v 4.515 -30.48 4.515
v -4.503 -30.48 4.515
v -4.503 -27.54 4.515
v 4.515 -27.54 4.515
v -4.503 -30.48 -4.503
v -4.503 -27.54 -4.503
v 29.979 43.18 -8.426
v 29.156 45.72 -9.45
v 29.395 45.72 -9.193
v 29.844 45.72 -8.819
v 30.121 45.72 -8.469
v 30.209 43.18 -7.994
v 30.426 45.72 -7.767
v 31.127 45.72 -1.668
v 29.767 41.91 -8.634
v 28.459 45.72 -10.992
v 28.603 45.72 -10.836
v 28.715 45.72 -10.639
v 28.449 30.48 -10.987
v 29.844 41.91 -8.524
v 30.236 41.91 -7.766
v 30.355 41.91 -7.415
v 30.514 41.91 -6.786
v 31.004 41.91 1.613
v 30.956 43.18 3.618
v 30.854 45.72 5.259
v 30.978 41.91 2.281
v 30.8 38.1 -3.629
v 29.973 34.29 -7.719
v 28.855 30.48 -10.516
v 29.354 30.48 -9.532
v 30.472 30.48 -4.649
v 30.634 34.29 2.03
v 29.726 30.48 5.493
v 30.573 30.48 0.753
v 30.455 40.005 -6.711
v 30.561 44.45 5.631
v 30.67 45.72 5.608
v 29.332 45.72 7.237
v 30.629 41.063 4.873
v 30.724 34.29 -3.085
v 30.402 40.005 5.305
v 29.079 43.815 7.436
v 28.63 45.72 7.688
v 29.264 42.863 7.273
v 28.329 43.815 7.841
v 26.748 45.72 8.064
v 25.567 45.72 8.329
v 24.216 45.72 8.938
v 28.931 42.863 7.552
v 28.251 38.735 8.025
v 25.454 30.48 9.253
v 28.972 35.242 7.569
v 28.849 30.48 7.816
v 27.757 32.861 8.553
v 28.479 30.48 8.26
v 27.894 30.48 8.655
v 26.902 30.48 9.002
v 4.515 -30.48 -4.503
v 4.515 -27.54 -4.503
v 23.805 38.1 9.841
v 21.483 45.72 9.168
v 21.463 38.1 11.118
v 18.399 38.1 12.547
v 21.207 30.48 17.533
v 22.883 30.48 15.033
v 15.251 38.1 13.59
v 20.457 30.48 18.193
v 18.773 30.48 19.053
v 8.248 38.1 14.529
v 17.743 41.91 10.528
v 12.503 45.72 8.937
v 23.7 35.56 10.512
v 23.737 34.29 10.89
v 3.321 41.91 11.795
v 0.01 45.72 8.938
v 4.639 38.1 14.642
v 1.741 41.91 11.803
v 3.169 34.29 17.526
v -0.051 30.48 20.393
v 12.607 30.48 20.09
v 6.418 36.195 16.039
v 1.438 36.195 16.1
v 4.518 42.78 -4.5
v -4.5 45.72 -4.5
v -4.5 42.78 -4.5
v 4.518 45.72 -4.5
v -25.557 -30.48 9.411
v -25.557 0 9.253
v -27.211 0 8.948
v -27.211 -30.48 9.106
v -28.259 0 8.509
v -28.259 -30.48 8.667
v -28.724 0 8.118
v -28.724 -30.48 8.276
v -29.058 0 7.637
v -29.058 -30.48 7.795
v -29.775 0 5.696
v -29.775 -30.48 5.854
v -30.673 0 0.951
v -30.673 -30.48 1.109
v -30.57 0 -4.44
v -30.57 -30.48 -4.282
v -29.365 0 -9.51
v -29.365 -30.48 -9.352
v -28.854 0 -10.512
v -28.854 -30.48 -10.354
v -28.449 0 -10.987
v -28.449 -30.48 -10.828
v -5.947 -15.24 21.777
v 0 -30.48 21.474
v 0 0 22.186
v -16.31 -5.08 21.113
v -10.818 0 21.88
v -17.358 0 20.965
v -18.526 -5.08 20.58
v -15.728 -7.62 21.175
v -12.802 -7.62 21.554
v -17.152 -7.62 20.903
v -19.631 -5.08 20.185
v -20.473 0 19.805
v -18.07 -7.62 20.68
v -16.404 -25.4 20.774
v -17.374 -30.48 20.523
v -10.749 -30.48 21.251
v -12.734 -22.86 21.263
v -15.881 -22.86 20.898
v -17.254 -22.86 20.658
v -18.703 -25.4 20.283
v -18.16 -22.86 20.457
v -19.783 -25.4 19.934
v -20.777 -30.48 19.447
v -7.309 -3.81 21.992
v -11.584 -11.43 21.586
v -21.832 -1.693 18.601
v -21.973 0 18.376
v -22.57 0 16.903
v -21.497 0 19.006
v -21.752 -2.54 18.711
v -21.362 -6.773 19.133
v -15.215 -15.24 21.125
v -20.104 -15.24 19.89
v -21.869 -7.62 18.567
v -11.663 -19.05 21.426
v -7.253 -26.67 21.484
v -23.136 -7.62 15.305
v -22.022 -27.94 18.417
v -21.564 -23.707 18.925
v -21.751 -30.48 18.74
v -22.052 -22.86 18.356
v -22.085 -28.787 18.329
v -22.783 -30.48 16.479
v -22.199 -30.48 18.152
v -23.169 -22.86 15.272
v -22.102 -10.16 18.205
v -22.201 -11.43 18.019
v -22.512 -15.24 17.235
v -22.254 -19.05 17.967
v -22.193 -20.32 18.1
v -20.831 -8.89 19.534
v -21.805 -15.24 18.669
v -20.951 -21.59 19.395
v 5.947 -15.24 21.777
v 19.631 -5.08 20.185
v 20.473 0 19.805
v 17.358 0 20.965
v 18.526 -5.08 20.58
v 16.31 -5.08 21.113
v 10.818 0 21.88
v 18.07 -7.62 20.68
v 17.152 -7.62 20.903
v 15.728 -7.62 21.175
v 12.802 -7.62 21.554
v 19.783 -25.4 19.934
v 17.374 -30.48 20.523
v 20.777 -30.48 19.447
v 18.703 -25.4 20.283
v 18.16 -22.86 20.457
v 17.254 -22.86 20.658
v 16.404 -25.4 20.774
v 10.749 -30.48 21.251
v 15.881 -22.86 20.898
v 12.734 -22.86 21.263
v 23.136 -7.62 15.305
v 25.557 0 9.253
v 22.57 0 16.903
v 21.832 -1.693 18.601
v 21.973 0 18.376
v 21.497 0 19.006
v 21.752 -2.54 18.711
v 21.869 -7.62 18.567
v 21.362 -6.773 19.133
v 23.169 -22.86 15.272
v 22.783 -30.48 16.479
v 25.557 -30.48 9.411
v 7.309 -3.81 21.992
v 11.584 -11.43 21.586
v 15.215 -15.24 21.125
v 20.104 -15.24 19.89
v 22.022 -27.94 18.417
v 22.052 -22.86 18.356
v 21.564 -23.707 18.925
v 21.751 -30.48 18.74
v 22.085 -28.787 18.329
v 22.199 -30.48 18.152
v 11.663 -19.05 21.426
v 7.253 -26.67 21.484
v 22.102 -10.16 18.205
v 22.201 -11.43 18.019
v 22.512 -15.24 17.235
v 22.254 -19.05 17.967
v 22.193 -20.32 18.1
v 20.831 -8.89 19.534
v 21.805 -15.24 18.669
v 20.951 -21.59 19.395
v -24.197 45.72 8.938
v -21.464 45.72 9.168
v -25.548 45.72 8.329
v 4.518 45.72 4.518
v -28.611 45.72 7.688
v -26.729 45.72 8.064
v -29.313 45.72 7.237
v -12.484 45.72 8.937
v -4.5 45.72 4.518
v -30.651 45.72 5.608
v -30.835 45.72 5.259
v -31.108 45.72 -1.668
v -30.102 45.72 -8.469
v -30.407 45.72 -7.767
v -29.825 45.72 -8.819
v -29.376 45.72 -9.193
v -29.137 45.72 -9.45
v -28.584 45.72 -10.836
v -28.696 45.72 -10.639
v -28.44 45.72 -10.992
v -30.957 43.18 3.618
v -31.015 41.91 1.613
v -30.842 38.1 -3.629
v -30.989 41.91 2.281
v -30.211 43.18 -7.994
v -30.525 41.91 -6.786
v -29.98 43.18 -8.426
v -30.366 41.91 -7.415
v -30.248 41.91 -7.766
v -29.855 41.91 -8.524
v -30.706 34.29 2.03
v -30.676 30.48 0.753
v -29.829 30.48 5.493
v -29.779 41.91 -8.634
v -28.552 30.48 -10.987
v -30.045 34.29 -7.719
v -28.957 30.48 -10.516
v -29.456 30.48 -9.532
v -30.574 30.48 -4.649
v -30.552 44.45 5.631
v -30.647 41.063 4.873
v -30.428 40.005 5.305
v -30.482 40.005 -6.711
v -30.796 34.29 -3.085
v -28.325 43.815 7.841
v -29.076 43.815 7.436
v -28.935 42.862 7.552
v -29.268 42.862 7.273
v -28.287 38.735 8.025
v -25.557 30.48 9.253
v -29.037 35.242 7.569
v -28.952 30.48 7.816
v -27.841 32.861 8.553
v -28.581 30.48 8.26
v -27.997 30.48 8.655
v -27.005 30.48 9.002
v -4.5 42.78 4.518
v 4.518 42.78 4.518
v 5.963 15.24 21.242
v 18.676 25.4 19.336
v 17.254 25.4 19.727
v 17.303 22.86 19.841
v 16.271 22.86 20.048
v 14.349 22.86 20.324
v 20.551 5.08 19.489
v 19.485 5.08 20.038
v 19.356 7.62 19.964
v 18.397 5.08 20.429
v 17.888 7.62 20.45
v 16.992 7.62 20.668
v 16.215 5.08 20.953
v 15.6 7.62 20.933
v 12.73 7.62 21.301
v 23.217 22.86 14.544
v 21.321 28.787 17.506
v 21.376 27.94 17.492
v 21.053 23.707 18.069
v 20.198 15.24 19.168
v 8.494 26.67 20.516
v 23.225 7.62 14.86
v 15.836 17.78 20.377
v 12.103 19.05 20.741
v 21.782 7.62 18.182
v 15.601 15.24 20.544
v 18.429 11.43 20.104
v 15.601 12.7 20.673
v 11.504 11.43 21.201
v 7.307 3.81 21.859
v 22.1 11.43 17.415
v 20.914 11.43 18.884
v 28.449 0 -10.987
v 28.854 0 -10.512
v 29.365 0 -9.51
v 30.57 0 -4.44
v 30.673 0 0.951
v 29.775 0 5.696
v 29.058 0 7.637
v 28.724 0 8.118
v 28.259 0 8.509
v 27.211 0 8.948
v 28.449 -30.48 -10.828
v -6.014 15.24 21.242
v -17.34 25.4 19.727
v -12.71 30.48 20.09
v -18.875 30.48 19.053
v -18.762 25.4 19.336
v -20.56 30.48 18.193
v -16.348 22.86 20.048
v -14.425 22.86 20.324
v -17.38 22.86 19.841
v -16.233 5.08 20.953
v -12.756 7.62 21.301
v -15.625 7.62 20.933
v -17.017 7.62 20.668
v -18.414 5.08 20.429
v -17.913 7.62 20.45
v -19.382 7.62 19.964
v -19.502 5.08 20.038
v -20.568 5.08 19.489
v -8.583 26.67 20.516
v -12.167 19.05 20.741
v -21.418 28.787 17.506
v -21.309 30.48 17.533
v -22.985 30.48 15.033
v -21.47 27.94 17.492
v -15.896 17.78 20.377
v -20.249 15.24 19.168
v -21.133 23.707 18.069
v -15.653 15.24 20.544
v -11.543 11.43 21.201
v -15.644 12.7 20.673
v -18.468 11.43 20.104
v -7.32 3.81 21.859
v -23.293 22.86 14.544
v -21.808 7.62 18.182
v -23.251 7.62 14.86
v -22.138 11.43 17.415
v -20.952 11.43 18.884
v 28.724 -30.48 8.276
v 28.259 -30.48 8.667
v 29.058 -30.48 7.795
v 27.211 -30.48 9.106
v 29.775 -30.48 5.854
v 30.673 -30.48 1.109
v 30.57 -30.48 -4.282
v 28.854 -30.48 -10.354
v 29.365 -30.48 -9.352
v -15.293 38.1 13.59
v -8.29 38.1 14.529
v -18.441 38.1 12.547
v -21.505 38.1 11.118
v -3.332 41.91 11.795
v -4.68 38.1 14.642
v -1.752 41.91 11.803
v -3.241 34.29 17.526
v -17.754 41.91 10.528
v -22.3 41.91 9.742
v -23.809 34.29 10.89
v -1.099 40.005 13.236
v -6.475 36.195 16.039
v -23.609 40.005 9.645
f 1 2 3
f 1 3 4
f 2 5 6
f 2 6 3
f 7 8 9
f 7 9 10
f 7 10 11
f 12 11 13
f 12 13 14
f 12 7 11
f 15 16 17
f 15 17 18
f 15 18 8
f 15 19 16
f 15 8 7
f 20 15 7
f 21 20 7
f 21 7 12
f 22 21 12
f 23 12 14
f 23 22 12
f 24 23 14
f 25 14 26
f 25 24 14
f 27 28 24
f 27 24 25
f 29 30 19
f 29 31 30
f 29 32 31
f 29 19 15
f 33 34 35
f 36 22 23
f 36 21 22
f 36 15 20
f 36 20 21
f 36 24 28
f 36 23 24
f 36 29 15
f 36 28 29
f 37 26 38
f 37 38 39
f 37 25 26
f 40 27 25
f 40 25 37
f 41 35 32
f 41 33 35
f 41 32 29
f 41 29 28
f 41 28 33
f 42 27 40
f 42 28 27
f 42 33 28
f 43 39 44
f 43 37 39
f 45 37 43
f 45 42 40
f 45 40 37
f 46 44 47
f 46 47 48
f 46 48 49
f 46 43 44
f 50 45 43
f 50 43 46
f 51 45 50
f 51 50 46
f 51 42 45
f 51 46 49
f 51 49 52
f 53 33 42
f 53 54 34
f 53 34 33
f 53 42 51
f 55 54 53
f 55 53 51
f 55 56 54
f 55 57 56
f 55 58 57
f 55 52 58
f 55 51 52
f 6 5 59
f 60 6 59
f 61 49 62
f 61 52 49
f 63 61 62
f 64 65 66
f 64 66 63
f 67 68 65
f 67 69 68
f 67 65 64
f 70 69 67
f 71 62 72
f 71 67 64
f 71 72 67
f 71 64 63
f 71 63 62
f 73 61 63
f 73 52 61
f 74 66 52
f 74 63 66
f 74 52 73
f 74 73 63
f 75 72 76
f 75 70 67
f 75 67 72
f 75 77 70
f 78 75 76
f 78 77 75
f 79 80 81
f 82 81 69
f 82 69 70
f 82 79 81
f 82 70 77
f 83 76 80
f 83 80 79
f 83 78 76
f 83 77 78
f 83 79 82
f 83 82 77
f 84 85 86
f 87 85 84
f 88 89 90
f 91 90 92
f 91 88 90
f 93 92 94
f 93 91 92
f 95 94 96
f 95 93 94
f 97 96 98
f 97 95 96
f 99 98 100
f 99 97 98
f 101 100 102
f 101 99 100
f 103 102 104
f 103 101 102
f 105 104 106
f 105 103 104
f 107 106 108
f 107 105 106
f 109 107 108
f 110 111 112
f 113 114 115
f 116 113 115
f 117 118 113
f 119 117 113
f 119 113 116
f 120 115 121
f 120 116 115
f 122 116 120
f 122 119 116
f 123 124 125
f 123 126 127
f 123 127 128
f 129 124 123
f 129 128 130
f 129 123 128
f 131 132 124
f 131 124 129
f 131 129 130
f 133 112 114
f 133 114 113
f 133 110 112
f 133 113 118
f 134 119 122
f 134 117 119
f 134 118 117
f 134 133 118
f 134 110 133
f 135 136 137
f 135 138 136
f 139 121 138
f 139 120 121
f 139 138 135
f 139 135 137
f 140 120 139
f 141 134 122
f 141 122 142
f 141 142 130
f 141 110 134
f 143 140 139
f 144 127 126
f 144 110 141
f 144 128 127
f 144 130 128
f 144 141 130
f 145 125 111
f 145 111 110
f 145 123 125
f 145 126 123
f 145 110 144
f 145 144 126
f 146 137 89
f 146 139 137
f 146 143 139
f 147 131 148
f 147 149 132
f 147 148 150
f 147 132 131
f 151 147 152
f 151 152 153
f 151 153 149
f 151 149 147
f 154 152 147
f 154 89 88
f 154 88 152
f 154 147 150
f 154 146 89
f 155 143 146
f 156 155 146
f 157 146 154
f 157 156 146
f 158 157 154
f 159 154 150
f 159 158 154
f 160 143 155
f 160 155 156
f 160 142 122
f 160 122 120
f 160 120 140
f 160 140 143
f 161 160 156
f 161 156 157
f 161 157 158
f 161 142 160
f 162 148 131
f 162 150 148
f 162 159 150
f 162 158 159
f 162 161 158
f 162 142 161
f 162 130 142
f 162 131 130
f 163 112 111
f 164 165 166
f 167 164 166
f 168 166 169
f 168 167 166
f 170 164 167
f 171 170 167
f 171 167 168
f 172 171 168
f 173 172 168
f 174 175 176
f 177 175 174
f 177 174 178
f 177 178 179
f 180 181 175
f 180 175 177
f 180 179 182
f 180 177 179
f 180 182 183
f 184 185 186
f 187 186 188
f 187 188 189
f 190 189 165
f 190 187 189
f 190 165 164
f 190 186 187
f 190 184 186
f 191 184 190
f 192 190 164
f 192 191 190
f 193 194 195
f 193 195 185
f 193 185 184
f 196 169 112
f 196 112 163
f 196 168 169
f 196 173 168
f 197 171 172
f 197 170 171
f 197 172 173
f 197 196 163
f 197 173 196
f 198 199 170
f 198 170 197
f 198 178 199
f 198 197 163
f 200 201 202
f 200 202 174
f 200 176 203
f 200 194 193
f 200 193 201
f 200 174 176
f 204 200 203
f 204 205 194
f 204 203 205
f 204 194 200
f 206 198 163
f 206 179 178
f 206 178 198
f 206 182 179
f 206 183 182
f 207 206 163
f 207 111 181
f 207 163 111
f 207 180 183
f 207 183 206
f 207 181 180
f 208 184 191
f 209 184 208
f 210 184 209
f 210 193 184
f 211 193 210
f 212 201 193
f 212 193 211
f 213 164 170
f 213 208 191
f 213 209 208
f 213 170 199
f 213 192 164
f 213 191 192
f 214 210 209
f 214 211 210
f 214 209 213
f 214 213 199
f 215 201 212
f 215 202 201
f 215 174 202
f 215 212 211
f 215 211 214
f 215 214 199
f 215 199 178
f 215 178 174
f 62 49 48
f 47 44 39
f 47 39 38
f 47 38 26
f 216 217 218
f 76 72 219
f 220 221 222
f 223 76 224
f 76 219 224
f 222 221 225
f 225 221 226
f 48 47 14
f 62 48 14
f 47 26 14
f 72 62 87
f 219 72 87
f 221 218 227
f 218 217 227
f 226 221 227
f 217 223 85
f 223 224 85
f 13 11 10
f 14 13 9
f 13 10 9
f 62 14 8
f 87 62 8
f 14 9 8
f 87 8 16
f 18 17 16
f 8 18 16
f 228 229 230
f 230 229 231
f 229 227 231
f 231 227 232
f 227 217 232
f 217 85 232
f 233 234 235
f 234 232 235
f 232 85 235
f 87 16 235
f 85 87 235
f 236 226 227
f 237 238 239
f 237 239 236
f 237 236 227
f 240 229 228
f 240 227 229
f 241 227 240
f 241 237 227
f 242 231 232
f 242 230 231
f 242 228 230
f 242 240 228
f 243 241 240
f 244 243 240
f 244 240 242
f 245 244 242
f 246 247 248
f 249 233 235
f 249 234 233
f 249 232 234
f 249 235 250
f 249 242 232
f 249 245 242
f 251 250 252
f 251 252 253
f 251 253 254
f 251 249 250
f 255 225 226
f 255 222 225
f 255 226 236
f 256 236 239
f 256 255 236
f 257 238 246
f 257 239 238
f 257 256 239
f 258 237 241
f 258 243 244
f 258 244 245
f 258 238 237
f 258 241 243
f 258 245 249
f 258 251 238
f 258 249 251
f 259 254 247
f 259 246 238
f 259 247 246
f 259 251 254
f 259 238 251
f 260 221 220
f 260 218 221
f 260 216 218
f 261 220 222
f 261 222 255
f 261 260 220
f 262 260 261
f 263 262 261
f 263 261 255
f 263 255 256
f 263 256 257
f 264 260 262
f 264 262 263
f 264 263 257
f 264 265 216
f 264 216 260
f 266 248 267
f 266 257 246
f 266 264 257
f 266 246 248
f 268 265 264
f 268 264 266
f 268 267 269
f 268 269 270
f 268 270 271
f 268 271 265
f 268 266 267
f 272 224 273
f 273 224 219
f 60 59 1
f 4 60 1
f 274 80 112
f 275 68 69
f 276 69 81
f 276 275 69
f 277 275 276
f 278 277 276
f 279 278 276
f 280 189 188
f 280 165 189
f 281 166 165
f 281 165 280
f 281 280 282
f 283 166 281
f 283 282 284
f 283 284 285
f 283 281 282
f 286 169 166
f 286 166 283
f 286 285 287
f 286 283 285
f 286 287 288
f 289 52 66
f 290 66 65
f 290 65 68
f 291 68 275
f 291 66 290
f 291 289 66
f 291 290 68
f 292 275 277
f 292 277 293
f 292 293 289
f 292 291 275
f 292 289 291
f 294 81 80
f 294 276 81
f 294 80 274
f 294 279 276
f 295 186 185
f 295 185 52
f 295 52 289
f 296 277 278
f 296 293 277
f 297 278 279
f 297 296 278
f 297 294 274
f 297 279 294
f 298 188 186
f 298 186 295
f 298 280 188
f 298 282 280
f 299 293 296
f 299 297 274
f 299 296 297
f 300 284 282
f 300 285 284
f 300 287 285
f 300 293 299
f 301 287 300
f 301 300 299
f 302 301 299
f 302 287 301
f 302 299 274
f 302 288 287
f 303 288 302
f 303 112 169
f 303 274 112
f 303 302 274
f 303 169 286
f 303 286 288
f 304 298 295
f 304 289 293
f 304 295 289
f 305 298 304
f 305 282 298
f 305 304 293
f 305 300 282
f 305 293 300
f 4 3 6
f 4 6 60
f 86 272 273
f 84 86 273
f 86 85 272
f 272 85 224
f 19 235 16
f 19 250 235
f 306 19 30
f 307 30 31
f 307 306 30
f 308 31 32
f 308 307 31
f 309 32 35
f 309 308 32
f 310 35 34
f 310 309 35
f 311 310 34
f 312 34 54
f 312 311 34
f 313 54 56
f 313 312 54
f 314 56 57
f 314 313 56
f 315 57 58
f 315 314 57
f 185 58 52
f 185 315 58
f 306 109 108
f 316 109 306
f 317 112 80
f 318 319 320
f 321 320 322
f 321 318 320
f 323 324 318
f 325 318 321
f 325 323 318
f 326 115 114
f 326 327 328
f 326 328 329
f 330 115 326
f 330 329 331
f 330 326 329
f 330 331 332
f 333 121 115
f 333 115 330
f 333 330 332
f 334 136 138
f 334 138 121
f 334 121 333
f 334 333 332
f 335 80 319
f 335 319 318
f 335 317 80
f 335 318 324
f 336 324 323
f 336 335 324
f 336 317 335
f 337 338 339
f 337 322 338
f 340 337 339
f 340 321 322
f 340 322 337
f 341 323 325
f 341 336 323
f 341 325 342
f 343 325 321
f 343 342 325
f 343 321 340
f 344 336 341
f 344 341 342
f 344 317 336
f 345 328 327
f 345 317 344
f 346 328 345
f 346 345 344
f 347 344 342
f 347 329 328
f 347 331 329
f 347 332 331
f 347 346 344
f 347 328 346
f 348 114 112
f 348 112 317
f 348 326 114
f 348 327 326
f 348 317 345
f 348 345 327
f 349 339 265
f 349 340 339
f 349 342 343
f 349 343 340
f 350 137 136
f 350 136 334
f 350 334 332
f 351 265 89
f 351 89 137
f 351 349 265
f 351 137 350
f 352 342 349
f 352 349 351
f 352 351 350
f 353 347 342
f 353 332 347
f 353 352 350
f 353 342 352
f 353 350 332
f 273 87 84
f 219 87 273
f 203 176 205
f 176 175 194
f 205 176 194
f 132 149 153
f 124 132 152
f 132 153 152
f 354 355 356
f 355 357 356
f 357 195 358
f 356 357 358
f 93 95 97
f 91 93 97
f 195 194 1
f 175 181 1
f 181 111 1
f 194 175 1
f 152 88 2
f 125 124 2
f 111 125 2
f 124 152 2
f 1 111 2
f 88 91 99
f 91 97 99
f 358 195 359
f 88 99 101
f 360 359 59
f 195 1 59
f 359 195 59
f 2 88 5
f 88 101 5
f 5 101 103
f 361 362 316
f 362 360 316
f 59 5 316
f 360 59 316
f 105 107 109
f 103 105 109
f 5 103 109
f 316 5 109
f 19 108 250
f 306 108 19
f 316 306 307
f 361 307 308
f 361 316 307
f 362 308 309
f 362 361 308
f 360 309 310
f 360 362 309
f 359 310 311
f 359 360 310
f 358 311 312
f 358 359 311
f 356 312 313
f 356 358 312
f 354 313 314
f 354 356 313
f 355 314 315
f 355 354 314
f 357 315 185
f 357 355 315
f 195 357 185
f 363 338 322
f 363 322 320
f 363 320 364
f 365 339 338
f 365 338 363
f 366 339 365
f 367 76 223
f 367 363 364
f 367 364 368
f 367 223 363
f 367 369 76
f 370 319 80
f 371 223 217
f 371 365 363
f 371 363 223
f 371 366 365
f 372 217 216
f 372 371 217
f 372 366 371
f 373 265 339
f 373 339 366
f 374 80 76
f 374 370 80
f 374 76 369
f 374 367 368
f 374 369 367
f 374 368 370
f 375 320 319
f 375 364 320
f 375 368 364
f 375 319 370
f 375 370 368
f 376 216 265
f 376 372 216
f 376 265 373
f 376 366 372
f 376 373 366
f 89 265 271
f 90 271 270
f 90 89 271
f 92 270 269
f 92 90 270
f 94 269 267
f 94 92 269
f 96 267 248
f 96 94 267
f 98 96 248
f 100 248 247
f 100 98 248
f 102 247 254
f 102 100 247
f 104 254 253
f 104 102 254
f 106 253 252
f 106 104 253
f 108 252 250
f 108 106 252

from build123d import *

# Parameters (mm, degrees)
F8_W      = 150.3
F8_H      = 150.3
F15_DEPTH = 49
F16_W     = 150.3
F16_H     = 150.3
F17_DEPTH = 49
F18_SCALE = 0.06


with BuildPart() as f9:
    # F7 (on offset) → F9 section 0
    with BuildSketch(Plane.XZ.offset(-762)):
        with BuildLine():
            Line((0.1584887505, -183.1980922269), (0.1584887505, 148.9692763008))
            add(Edge.make_bspline(
                [(-403.2837748528, 148.9692763008), (-361.9413971901, 155.9843108572), (-300.8599900284, 146.0628981015), (-125.8436559494, 151.2423181929), (-46.7571673235, 148.9692763008), (0.1584887505, 148.9692763008)],
                knots=[0, 0, 0, 0, 0.2984259287, 0.6695630928, 1, 1, 1, 1], degree=3))
            add(Edge.make_bspline(
                [(-473.9971756935, -183.1980922269), (-480.5770214293, -177.9163295695), (-481.5710687682, -151.5276075961), (-520.6987799625, -148.0816034945), (-521.1208757291, 78.7741568252), (-510.6917945334, 93.6804495958), (-477.9211180885, 141.4877688131), (-435.9205000594, 129.5729096626), (-403.2837748528, 148.9692763008)],
                knots=[0.0998476522, 0.0998476522, 0.0998476522, 0.0998476522, 0.2041896676, 0.3100333363, 0.5970663664, 0.6946290463, 0.8249758157, 1, 1, 1, 1], degree=3))
            Line((-473.9971756935, -183.1980922269), (-448.5557532602, -183.1980922269))
            Line((-448.5557532602, -183.1980922269), (0.1584887505, -183.1980922269))
        make_face()
    # F3 (on offset) → F9 section 1
    with BuildSketch(Plane.XZ.offset(-508)):
        with BuildLine():
            Line((-448.7142420107, -183.1095217108), (-0.8547306061, -183.1095217108))
            Line((-0.8547306061, -183.1095217108), (-0.8547306061, 339.8833276392))
            add(Edge.make_bspline(
                [(-425.9420335293, 154.2110444666), (-412.46534384, 180.6685756473), (-406.3800631287, 202.4829286635), (-381.928427354, 254.8373079925), (-342.7353016167, 318.766364781), (-268.3299880886, 341.1130193989), (-0.8547306061, 339.8833276392)],
                knots=[0, 0, 0, 0, 0.1858707903, 0.3633687117, 0.53553365, 1, 1, 1, 1], degree=3))
            add(Edge.make_bspline(
                [(-475.8651256561, -183.1095217108), (-495.6553124123, -166.8569903526), (-526.8397519259, -26.030289038), (-492.5296911823, 120.5917099646), (-474.0125038157, 148.3755705213), (-425.9420335293, 154.2110444666)],
                knots=[0.1352188376, 0.1352188376, 0.1352188376, 0.1352188376, 0.4578837471, 0.7745389991, 1, 1, 1, 1], degree=3))
            Line((-475.8651256561, -183.1095217108), (-448.7142420107, -183.1095217108))
        make_face()
    loft()

    # F7 (on offset) → F10 section 0
    with BuildSketch(Plane.XZ.offset(-762)):
        with BuildLine():
            add(Edge.make_bspline(
                [(403.6007523537, 148.9692763008), (362.258374691, 155.9843108572), (301.1769675294, 146.0628981015), (126.1606334503, 151.2423181929), (47.0741448244, 148.9692763008), (0.1584887505, 148.9692763008)],
                knots=[0, 0, 0, 0, 0.2984259287, 0.6695630928, 1, 1, 1, 1], degree=3))
            Line((0.1584887505, 148.9692763008), (0.1584887505, -183.1980922269))
            Line((0.1584887505, -183.1980922269), (448.8727307612, -183.1980922269))
            Line((448.8727307612, -183.1980922269), (474.3141531944, -183.1980922269))
            add(Edge.make_bspline(
                [(474.3141531944, -183.1980922269), (480.8939989302, -177.9163295695), (481.8880462691, -151.5276075961), (521.0157574634, -148.0816034945), (521.43785323, 78.7741568252), (511.0087720343, 93.6804495958), (478.2380955895, 141.4877688131), (436.2374775603, 129.5729096626), (403.6007523537, 148.9692763008)],
                knots=[0.0998476522, 0.0998476522, 0.0998476522, 0.0998476522, 0.2041896676, 0.3100333363, 0.5970663664, 0.6946290463, 0.8249758157, 1, 1, 1, 1], degree=3))
        make_face()
    # F3 (on offset) → F10 section 1
    with BuildSketch(Plane.XZ.offset(-508)):
        with BuildLine():
            Line((-0.8547306061, 339.8833276392), (-0.8547306061, -183.1095217108))
            Line((-0.8547306061, -183.1095217108), (447.0047807985, -183.1095217108))
            Line((447.0047807985, -183.1095217108), (474.155664444, -183.1095217108))
            add(Edge.make_bspline(
                [(474.155664444, -183.1095217108), (493.9458512002, -166.8569903526), (525.1302907138, -26.030289038), (490.8202299702, 120.5917099646), (472.3030426035, 148.3755705213), (424.2325723171, 154.2110444666)],
                knots=[0.1352188376, 0.1352188376, 0.1352188376, 0.1352188376, 0.4578837471, 0.7745389991, 1, 1, 1, 1], degree=3))
            add(Edge.make_bspline(
                [(424.2325723171, 154.2110444666), (410.7558826278, 180.6685756473), (404.6706019165, 202.4829286635), (380.2189661418, 254.8373079925), (341.0258404045, 318.766364781), (266.6205268764, 341.1130193989), (-0.8547306061, 339.8833276392)],
                knots=[0, 0, 0, 0, 0.1858707903, 0.3633687117, 0.53553365, 1, 1, 1, 1], degree=3))
        make_face()
    loft()

    # F3 (on offset) → F11 section 0
    with BuildSketch(Plane.XZ.offset(-508)):
        with BuildLine():
            Line((-448.7142420107, -183.1095217108), (-0.8547306061, -183.1095217108))
            Line((-0.8547306061, -183.1095217108), (-0.8547306061, 339.8833276392))
            add(Edge.make_bspline(
                [(-425.9420335293, 154.2110444666), (-412.46534384, 180.6685756473), (-406.3800631287, 202.4829286635), (-381.928427354, 254.8373079925), (-342.7353016167, 318.766364781), (-268.3299880886, 341.1130193989), (-0.8547306061, 339.8833276392)],
                knots=[0, 0, 0, 0, 0.1858707903, 0.3633687117, 0.53553365, 1, 1, 1, 1], degree=3))
            add(Edge.make_bspline(
                [(-475.8651256561, -183.1095217108), (-495.6553124123, -166.8569903526), (-526.8397519259, -26.030289038), (-492.5296911823, 120.5917099646), (-474.0125038157, 148.3755705213), (-425.9420335293, 154.2110444666)],
                knots=[0.1352188376, 0.1352188376, 0.1352188376, 0.1352188376, 0.4578837471, 0.7745389991, 1, 1, 1, 1], degree=3))
            Line((-475.8651256561, -183.1095217108), (-448.7142420107, -183.1095217108))
        make_face()
    # F0 (on Front) → F11 section 1
    with BuildSketch(Plane.XZ):
        with BuildLine():
            Line((-448.7142418908, -183.1095215051), (1.199e-07, -183.1095215051))
            Line((1.199e-07, -183.1095215051), (1.199e-07, 369.7673383983))
            add(Edge.make_bspline(
                [(-425.9420334094, 154.2110446723), (-412.7864856493, 180.0381077778), (-406.2769170657, 200.4261421029), (-376.8966252496, 276.0657125006), (-361.6660609239, 334.9040835407), (-265.0778939608, 370.9860085104), (1.199e-07, 369.7673383983)],
                knots=[0, 0, 0, 0, 0.181441594, 0.3874182486, 0.5396966318, 1, 1, 1, 1], degree=3))
            add(Edge.make_bspline(
                [(-474.1556643241, -183.1095215051), (-493.3795421324, -167.1268559789), (-527.9322253212, -26.0726288897), (-492.2015831078, 120.5996786697), (-474.200308203, 148.3527723582), (-425.9420334094, 154.2110446723)],
                knots=[0.1314042252, 0.1314042252, 0.1314042252, 0.1314042252, 0.4557657758, 0.7736581549, 1, 1, 1, 1], degree=3))
            Line((-474.1556643241, -183.1095215051), (-448.7142418908, -183.1095215051))
        make_face()
    loft()

    # F3 (on offset) → F12 section 0
    with BuildSketch(Plane.XZ.offset(-508)):
        with BuildLine():
            Line((-0.8547306061, 339.8833276392), (-0.8547306061, -183.1095217108))
            Line((-0.8547306061, -183.1095217108), (447.0047807985, -183.1095217108))
            Line((447.0047807985, -183.1095217108), (474.155664444, -183.1095217108))
            add(Edge.make_bspline(
                [(474.155664444, -183.1095217108), (493.9458512002, -166.8569903526), (525.1302907138, -26.030289038), (490.8202299702, 120.5917099646), (472.3030426035, 148.3755705213), (424.2325723171, 154.2110444666)],
                knots=[0.1352188376, 0.1352188376, 0.1352188376, 0.1352188376, 0.4578837471, 0.7745389991, 1, 1, 1, 1], degree=3))
            add(Edge.make_bspline(
                [(424.2325723171, 154.2110444666), (410.7558826278, 180.6685756473), (404.6706019165, 202.4829286635), (380.2189661418, 254.8373079925), (341.0258404045, 318.766364781), (266.6205268764, 341.1130193989), (-0.8547306061, 339.8833276392)],
                knots=[0, 0, 0, 0, 0.1858707903, 0.3633687117, 0.53553365, 1, 1, 1, 1], degree=3))
        make_face()
    # F0 (on Front) → F12 section 1
    with BuildSketch(Plane.XZ):
        with BuildLine():
            Line((1.199e-07, 369.7673383983), (1.199e-07, -183.1095215051))
            Line((1.199e-07, -183.1095215051), (448.7142421306, -183.1095215051))
            Line((448.7142421306, -183.1095215051), (474.1556645639, -183.1095215051))
            add(Edge.make_bspline(
                [(474.1556645639, -183.1095215051), (493.3795423723, -167.1268559789), (527.932225561, -26.0726288897), (492.2015833477, 120.5996786697), (474.2003084428, 148.3527723582), (425.9420336492, 154.2110446723)],
                knots=[0.1314042252, 0.1314042252, 0.1314042252, 0.1314042252, 0.4557657758, 0.7736581549, 1, 1, 1, 1], degree=3))
            add(Edge.make_bspline(
                [(425.9420336492, 154.2110446723), (412.7864858892, 180.0381077778), (406.2769173055, 200.4261421029), (376.8966254894, 276.0657125006), (361.6660611637, 334.9040835407), (265.0778942007, 370.9860085104), (1.199e-07, 369.7673383983)],
                knots=[0, 0, 0, 0, 0.181441594, 0.3874182486, 0.5396966318, 1, 1, 1, 1], degree=3))
        make_face()
    loft()

    # F0 (on Front) → F13 section 0
    with BuildSketch(Plane.XZ):
        with BuildLine():
            Line((-448.7142418908, -183.1095215051), (1.199e-07, -183.1095215051))
            Line((1.199e-07, -183.1095215051), (1.199e-07, 369.7673383983))
            add(Edge.make_bspline(
                [(-425.9420334094, 154.2110446723), (-412.7864856493, 180.0381077778), (-406.2769170657, 200.4261421029), (-376.8966252496, 276.0657125006), (-361.6660609239, 334.9040835407), (-265.0778939608, 370.9860085104), (1.199e-07, 369.7673383983)],
                knots=[0, 0, 0, 0, 0.181441594, 0.3874182486, 0.5396966318, 1, 1, 1, 1], degree=3))
            add(Edge.make_bspline(
                [(-474.1556643241, -183.1095215051), (-493.3795421324, -167.1268559789), (-527.9322253212, -26.0726288897), (-492.2015831078, 120.5996786697), (-474.200308203, 148.3527723582), (-425.9420334094, 154.2110446723)],
                knots=[0.1314042252, 0.1314042252, 0.1314042252, 0.1314042252, 0.4557657758, 0.7736581549, 1, 1, 1, 1], degree=3))
            Line((-474.1556643241, -183.1095215051), (-448.7142418908, -183.1095215051))
        make_face()
    # F4 (on offset) → F13 section 1
    with BuildSketch(Plane.XZ.offset(508)):
        with BuildLine():
            Line((-448.7142417362, -180.4738868312), (2.745e-07, -180.4738868312))
            Line((2.745e-07, -180.4738868312), (2.745e-07, 357.9041432305))
            add(Edge.make_bspline(
                [(-425.9420332548, 156.8466793461), (-412.6207322676, 182.9991503433), (-406.452987123, 203.3396138866), (-378.6300657187, 271.6390355657), (-368.7670559889, 330.8313455477), (-269.9509419989, 359.1452167128), (2.745e-07, 357.9041432305)],
                knots=[0, 0, 0, 0, 0.183727666, 0.3822248995, 0.5312346644, 1, 1, 1, 1], degree=3))
            add(Edge.make_bspline(
                [(-474.1556641695, -180.4738868312), (-493.3795419779, -164.491221305), (-527.9322251666, -23.4369942158), (-492.2015829533, 123.2353133436), (-474.2003080485, 150.9884070321), (-425.9420332548, 156.8466793461)],
                knots=[0.1314042252, 0.1314042252, 0.1314042252, 0.1314042252, 0.4557657758, 0.7736581549, 1, 1, 1, 1], degree=3))
            Line((-474.1556641695, -180.4738868312), (-448.7142417362, -180.4738868312))
        make_face()
    loft()

    # F0 (on Front) → F14 section 0
    with BuildSketch(Plane.XZ):
        with BuildLine():
            Line((1.199e-07, 369.7673383983), (1.199e-07, -183.1095215051))
            Line((1.199e-07, -183.1095215051), (448.7142421306, -183.1095215051))
            Line((448.7142421306, -183.1095215051), (474.1556645639, -183.1095215051))
            add(Edge.make_bspline(
                [(474.1556645639, -183.1095215051), (493.3795423723, -167.1268559789), (527.932225561, -26.0726288897), (492.2015833477, 120.5996786697), (474.2003084428, 148.3527723582), (425.9420336492, 154.2110446723)],
                knots=[0.1314042252, 0.1314042252, 0.1314042252, 0.1314042252, 0.4557657758, 0.7736581549, 1, 1, 1, 1], degree=3))
            add(Edge.make_bspline(
                [(425.9420336492, 154.2110446723), (412.7864858892, 180.0381077778), (406.2769173055, 200.4261421029), (376.8966254894, 276.0657125006), (361.6660611637, 334.9040835407), (265.0778942007, 370.9860085104), (1.199e-07, 369.7673383983)],
                knots=[0, 0, 0, 0, 0.181441594, 0.3874182486, 0.5396966318, 1, 1, 1, 1], degree=3))
        make_face()
    # F4 (on offset) → F14 section 1
    with BuildSketch(Plane.XZ.offset(508)):
        with BuildLine():
            Line((2.745e-07, 357.9041432305), (2.745e-07, -180.4738868312))
            Line((2.745e-07, -180.4738868312), (448.7142422852, -180.4738868312))
            Line((448.7142422852, -180.4738868312), (474.1556647184, -180.4738868312))
            add(Edge.make_bspline(
                [(474.1556647184, -180.4738868312), (493.3795425268, -164.491221305), (527.9322257156, -23.4369942158), (492.2015835022, 123.2353133436), (474.2003085974, 150.9884070321), (425.9420338037, 156.8466793461)],
                knots=[0.1314042252, 0.1314042252, 0.1314042252, 0.1314042252, 0.4557657758, 0.7736581549, 1, 1, 1, 1], degree=3))
            add(Edge.make_bspline(
                [(425.9420338037, 156.8466793461), (412.6207328165, 182.9991503433), (406.4529876719, 203.3396138866), (378.6300662676, 271.6390355657), (368.7670565379, 330.8313455477), (269.9509425478, 359.1452167128), (2.745e-07, 357.9041432305)],
                knots=[0, 0, 0, 0, 0.183727666, 0.3822248995, 0.5312346644, 1, 1, 1, 1], degree=3))
        make_face()
    loft()

    # F8 (on offset) → F15 (cut)
    with BuildSketch(Plane.XZ.offset(-762)):
        with Locations((0.15, 0.15)):
            Rectangle(F8_W, F8_H)
    extrude(amount=F15_DEPTH, mode=Mode.SUBTRACT)

    # F16 (on offset) → F17 (cut)
    with BuildSketch(Plane.XZ.offset(508)):
        with Locations((0.1, 0.1)):
            Rectangle(F16_W, F16_H)
    extrude(amount=-F17_DEPTH, mode=Mode.SUBTRACT)


with BuildPart() as f9_1:
    # F18: moved
    add(f9.part.scale(F18_SCALE))


solid = f9_1.part
